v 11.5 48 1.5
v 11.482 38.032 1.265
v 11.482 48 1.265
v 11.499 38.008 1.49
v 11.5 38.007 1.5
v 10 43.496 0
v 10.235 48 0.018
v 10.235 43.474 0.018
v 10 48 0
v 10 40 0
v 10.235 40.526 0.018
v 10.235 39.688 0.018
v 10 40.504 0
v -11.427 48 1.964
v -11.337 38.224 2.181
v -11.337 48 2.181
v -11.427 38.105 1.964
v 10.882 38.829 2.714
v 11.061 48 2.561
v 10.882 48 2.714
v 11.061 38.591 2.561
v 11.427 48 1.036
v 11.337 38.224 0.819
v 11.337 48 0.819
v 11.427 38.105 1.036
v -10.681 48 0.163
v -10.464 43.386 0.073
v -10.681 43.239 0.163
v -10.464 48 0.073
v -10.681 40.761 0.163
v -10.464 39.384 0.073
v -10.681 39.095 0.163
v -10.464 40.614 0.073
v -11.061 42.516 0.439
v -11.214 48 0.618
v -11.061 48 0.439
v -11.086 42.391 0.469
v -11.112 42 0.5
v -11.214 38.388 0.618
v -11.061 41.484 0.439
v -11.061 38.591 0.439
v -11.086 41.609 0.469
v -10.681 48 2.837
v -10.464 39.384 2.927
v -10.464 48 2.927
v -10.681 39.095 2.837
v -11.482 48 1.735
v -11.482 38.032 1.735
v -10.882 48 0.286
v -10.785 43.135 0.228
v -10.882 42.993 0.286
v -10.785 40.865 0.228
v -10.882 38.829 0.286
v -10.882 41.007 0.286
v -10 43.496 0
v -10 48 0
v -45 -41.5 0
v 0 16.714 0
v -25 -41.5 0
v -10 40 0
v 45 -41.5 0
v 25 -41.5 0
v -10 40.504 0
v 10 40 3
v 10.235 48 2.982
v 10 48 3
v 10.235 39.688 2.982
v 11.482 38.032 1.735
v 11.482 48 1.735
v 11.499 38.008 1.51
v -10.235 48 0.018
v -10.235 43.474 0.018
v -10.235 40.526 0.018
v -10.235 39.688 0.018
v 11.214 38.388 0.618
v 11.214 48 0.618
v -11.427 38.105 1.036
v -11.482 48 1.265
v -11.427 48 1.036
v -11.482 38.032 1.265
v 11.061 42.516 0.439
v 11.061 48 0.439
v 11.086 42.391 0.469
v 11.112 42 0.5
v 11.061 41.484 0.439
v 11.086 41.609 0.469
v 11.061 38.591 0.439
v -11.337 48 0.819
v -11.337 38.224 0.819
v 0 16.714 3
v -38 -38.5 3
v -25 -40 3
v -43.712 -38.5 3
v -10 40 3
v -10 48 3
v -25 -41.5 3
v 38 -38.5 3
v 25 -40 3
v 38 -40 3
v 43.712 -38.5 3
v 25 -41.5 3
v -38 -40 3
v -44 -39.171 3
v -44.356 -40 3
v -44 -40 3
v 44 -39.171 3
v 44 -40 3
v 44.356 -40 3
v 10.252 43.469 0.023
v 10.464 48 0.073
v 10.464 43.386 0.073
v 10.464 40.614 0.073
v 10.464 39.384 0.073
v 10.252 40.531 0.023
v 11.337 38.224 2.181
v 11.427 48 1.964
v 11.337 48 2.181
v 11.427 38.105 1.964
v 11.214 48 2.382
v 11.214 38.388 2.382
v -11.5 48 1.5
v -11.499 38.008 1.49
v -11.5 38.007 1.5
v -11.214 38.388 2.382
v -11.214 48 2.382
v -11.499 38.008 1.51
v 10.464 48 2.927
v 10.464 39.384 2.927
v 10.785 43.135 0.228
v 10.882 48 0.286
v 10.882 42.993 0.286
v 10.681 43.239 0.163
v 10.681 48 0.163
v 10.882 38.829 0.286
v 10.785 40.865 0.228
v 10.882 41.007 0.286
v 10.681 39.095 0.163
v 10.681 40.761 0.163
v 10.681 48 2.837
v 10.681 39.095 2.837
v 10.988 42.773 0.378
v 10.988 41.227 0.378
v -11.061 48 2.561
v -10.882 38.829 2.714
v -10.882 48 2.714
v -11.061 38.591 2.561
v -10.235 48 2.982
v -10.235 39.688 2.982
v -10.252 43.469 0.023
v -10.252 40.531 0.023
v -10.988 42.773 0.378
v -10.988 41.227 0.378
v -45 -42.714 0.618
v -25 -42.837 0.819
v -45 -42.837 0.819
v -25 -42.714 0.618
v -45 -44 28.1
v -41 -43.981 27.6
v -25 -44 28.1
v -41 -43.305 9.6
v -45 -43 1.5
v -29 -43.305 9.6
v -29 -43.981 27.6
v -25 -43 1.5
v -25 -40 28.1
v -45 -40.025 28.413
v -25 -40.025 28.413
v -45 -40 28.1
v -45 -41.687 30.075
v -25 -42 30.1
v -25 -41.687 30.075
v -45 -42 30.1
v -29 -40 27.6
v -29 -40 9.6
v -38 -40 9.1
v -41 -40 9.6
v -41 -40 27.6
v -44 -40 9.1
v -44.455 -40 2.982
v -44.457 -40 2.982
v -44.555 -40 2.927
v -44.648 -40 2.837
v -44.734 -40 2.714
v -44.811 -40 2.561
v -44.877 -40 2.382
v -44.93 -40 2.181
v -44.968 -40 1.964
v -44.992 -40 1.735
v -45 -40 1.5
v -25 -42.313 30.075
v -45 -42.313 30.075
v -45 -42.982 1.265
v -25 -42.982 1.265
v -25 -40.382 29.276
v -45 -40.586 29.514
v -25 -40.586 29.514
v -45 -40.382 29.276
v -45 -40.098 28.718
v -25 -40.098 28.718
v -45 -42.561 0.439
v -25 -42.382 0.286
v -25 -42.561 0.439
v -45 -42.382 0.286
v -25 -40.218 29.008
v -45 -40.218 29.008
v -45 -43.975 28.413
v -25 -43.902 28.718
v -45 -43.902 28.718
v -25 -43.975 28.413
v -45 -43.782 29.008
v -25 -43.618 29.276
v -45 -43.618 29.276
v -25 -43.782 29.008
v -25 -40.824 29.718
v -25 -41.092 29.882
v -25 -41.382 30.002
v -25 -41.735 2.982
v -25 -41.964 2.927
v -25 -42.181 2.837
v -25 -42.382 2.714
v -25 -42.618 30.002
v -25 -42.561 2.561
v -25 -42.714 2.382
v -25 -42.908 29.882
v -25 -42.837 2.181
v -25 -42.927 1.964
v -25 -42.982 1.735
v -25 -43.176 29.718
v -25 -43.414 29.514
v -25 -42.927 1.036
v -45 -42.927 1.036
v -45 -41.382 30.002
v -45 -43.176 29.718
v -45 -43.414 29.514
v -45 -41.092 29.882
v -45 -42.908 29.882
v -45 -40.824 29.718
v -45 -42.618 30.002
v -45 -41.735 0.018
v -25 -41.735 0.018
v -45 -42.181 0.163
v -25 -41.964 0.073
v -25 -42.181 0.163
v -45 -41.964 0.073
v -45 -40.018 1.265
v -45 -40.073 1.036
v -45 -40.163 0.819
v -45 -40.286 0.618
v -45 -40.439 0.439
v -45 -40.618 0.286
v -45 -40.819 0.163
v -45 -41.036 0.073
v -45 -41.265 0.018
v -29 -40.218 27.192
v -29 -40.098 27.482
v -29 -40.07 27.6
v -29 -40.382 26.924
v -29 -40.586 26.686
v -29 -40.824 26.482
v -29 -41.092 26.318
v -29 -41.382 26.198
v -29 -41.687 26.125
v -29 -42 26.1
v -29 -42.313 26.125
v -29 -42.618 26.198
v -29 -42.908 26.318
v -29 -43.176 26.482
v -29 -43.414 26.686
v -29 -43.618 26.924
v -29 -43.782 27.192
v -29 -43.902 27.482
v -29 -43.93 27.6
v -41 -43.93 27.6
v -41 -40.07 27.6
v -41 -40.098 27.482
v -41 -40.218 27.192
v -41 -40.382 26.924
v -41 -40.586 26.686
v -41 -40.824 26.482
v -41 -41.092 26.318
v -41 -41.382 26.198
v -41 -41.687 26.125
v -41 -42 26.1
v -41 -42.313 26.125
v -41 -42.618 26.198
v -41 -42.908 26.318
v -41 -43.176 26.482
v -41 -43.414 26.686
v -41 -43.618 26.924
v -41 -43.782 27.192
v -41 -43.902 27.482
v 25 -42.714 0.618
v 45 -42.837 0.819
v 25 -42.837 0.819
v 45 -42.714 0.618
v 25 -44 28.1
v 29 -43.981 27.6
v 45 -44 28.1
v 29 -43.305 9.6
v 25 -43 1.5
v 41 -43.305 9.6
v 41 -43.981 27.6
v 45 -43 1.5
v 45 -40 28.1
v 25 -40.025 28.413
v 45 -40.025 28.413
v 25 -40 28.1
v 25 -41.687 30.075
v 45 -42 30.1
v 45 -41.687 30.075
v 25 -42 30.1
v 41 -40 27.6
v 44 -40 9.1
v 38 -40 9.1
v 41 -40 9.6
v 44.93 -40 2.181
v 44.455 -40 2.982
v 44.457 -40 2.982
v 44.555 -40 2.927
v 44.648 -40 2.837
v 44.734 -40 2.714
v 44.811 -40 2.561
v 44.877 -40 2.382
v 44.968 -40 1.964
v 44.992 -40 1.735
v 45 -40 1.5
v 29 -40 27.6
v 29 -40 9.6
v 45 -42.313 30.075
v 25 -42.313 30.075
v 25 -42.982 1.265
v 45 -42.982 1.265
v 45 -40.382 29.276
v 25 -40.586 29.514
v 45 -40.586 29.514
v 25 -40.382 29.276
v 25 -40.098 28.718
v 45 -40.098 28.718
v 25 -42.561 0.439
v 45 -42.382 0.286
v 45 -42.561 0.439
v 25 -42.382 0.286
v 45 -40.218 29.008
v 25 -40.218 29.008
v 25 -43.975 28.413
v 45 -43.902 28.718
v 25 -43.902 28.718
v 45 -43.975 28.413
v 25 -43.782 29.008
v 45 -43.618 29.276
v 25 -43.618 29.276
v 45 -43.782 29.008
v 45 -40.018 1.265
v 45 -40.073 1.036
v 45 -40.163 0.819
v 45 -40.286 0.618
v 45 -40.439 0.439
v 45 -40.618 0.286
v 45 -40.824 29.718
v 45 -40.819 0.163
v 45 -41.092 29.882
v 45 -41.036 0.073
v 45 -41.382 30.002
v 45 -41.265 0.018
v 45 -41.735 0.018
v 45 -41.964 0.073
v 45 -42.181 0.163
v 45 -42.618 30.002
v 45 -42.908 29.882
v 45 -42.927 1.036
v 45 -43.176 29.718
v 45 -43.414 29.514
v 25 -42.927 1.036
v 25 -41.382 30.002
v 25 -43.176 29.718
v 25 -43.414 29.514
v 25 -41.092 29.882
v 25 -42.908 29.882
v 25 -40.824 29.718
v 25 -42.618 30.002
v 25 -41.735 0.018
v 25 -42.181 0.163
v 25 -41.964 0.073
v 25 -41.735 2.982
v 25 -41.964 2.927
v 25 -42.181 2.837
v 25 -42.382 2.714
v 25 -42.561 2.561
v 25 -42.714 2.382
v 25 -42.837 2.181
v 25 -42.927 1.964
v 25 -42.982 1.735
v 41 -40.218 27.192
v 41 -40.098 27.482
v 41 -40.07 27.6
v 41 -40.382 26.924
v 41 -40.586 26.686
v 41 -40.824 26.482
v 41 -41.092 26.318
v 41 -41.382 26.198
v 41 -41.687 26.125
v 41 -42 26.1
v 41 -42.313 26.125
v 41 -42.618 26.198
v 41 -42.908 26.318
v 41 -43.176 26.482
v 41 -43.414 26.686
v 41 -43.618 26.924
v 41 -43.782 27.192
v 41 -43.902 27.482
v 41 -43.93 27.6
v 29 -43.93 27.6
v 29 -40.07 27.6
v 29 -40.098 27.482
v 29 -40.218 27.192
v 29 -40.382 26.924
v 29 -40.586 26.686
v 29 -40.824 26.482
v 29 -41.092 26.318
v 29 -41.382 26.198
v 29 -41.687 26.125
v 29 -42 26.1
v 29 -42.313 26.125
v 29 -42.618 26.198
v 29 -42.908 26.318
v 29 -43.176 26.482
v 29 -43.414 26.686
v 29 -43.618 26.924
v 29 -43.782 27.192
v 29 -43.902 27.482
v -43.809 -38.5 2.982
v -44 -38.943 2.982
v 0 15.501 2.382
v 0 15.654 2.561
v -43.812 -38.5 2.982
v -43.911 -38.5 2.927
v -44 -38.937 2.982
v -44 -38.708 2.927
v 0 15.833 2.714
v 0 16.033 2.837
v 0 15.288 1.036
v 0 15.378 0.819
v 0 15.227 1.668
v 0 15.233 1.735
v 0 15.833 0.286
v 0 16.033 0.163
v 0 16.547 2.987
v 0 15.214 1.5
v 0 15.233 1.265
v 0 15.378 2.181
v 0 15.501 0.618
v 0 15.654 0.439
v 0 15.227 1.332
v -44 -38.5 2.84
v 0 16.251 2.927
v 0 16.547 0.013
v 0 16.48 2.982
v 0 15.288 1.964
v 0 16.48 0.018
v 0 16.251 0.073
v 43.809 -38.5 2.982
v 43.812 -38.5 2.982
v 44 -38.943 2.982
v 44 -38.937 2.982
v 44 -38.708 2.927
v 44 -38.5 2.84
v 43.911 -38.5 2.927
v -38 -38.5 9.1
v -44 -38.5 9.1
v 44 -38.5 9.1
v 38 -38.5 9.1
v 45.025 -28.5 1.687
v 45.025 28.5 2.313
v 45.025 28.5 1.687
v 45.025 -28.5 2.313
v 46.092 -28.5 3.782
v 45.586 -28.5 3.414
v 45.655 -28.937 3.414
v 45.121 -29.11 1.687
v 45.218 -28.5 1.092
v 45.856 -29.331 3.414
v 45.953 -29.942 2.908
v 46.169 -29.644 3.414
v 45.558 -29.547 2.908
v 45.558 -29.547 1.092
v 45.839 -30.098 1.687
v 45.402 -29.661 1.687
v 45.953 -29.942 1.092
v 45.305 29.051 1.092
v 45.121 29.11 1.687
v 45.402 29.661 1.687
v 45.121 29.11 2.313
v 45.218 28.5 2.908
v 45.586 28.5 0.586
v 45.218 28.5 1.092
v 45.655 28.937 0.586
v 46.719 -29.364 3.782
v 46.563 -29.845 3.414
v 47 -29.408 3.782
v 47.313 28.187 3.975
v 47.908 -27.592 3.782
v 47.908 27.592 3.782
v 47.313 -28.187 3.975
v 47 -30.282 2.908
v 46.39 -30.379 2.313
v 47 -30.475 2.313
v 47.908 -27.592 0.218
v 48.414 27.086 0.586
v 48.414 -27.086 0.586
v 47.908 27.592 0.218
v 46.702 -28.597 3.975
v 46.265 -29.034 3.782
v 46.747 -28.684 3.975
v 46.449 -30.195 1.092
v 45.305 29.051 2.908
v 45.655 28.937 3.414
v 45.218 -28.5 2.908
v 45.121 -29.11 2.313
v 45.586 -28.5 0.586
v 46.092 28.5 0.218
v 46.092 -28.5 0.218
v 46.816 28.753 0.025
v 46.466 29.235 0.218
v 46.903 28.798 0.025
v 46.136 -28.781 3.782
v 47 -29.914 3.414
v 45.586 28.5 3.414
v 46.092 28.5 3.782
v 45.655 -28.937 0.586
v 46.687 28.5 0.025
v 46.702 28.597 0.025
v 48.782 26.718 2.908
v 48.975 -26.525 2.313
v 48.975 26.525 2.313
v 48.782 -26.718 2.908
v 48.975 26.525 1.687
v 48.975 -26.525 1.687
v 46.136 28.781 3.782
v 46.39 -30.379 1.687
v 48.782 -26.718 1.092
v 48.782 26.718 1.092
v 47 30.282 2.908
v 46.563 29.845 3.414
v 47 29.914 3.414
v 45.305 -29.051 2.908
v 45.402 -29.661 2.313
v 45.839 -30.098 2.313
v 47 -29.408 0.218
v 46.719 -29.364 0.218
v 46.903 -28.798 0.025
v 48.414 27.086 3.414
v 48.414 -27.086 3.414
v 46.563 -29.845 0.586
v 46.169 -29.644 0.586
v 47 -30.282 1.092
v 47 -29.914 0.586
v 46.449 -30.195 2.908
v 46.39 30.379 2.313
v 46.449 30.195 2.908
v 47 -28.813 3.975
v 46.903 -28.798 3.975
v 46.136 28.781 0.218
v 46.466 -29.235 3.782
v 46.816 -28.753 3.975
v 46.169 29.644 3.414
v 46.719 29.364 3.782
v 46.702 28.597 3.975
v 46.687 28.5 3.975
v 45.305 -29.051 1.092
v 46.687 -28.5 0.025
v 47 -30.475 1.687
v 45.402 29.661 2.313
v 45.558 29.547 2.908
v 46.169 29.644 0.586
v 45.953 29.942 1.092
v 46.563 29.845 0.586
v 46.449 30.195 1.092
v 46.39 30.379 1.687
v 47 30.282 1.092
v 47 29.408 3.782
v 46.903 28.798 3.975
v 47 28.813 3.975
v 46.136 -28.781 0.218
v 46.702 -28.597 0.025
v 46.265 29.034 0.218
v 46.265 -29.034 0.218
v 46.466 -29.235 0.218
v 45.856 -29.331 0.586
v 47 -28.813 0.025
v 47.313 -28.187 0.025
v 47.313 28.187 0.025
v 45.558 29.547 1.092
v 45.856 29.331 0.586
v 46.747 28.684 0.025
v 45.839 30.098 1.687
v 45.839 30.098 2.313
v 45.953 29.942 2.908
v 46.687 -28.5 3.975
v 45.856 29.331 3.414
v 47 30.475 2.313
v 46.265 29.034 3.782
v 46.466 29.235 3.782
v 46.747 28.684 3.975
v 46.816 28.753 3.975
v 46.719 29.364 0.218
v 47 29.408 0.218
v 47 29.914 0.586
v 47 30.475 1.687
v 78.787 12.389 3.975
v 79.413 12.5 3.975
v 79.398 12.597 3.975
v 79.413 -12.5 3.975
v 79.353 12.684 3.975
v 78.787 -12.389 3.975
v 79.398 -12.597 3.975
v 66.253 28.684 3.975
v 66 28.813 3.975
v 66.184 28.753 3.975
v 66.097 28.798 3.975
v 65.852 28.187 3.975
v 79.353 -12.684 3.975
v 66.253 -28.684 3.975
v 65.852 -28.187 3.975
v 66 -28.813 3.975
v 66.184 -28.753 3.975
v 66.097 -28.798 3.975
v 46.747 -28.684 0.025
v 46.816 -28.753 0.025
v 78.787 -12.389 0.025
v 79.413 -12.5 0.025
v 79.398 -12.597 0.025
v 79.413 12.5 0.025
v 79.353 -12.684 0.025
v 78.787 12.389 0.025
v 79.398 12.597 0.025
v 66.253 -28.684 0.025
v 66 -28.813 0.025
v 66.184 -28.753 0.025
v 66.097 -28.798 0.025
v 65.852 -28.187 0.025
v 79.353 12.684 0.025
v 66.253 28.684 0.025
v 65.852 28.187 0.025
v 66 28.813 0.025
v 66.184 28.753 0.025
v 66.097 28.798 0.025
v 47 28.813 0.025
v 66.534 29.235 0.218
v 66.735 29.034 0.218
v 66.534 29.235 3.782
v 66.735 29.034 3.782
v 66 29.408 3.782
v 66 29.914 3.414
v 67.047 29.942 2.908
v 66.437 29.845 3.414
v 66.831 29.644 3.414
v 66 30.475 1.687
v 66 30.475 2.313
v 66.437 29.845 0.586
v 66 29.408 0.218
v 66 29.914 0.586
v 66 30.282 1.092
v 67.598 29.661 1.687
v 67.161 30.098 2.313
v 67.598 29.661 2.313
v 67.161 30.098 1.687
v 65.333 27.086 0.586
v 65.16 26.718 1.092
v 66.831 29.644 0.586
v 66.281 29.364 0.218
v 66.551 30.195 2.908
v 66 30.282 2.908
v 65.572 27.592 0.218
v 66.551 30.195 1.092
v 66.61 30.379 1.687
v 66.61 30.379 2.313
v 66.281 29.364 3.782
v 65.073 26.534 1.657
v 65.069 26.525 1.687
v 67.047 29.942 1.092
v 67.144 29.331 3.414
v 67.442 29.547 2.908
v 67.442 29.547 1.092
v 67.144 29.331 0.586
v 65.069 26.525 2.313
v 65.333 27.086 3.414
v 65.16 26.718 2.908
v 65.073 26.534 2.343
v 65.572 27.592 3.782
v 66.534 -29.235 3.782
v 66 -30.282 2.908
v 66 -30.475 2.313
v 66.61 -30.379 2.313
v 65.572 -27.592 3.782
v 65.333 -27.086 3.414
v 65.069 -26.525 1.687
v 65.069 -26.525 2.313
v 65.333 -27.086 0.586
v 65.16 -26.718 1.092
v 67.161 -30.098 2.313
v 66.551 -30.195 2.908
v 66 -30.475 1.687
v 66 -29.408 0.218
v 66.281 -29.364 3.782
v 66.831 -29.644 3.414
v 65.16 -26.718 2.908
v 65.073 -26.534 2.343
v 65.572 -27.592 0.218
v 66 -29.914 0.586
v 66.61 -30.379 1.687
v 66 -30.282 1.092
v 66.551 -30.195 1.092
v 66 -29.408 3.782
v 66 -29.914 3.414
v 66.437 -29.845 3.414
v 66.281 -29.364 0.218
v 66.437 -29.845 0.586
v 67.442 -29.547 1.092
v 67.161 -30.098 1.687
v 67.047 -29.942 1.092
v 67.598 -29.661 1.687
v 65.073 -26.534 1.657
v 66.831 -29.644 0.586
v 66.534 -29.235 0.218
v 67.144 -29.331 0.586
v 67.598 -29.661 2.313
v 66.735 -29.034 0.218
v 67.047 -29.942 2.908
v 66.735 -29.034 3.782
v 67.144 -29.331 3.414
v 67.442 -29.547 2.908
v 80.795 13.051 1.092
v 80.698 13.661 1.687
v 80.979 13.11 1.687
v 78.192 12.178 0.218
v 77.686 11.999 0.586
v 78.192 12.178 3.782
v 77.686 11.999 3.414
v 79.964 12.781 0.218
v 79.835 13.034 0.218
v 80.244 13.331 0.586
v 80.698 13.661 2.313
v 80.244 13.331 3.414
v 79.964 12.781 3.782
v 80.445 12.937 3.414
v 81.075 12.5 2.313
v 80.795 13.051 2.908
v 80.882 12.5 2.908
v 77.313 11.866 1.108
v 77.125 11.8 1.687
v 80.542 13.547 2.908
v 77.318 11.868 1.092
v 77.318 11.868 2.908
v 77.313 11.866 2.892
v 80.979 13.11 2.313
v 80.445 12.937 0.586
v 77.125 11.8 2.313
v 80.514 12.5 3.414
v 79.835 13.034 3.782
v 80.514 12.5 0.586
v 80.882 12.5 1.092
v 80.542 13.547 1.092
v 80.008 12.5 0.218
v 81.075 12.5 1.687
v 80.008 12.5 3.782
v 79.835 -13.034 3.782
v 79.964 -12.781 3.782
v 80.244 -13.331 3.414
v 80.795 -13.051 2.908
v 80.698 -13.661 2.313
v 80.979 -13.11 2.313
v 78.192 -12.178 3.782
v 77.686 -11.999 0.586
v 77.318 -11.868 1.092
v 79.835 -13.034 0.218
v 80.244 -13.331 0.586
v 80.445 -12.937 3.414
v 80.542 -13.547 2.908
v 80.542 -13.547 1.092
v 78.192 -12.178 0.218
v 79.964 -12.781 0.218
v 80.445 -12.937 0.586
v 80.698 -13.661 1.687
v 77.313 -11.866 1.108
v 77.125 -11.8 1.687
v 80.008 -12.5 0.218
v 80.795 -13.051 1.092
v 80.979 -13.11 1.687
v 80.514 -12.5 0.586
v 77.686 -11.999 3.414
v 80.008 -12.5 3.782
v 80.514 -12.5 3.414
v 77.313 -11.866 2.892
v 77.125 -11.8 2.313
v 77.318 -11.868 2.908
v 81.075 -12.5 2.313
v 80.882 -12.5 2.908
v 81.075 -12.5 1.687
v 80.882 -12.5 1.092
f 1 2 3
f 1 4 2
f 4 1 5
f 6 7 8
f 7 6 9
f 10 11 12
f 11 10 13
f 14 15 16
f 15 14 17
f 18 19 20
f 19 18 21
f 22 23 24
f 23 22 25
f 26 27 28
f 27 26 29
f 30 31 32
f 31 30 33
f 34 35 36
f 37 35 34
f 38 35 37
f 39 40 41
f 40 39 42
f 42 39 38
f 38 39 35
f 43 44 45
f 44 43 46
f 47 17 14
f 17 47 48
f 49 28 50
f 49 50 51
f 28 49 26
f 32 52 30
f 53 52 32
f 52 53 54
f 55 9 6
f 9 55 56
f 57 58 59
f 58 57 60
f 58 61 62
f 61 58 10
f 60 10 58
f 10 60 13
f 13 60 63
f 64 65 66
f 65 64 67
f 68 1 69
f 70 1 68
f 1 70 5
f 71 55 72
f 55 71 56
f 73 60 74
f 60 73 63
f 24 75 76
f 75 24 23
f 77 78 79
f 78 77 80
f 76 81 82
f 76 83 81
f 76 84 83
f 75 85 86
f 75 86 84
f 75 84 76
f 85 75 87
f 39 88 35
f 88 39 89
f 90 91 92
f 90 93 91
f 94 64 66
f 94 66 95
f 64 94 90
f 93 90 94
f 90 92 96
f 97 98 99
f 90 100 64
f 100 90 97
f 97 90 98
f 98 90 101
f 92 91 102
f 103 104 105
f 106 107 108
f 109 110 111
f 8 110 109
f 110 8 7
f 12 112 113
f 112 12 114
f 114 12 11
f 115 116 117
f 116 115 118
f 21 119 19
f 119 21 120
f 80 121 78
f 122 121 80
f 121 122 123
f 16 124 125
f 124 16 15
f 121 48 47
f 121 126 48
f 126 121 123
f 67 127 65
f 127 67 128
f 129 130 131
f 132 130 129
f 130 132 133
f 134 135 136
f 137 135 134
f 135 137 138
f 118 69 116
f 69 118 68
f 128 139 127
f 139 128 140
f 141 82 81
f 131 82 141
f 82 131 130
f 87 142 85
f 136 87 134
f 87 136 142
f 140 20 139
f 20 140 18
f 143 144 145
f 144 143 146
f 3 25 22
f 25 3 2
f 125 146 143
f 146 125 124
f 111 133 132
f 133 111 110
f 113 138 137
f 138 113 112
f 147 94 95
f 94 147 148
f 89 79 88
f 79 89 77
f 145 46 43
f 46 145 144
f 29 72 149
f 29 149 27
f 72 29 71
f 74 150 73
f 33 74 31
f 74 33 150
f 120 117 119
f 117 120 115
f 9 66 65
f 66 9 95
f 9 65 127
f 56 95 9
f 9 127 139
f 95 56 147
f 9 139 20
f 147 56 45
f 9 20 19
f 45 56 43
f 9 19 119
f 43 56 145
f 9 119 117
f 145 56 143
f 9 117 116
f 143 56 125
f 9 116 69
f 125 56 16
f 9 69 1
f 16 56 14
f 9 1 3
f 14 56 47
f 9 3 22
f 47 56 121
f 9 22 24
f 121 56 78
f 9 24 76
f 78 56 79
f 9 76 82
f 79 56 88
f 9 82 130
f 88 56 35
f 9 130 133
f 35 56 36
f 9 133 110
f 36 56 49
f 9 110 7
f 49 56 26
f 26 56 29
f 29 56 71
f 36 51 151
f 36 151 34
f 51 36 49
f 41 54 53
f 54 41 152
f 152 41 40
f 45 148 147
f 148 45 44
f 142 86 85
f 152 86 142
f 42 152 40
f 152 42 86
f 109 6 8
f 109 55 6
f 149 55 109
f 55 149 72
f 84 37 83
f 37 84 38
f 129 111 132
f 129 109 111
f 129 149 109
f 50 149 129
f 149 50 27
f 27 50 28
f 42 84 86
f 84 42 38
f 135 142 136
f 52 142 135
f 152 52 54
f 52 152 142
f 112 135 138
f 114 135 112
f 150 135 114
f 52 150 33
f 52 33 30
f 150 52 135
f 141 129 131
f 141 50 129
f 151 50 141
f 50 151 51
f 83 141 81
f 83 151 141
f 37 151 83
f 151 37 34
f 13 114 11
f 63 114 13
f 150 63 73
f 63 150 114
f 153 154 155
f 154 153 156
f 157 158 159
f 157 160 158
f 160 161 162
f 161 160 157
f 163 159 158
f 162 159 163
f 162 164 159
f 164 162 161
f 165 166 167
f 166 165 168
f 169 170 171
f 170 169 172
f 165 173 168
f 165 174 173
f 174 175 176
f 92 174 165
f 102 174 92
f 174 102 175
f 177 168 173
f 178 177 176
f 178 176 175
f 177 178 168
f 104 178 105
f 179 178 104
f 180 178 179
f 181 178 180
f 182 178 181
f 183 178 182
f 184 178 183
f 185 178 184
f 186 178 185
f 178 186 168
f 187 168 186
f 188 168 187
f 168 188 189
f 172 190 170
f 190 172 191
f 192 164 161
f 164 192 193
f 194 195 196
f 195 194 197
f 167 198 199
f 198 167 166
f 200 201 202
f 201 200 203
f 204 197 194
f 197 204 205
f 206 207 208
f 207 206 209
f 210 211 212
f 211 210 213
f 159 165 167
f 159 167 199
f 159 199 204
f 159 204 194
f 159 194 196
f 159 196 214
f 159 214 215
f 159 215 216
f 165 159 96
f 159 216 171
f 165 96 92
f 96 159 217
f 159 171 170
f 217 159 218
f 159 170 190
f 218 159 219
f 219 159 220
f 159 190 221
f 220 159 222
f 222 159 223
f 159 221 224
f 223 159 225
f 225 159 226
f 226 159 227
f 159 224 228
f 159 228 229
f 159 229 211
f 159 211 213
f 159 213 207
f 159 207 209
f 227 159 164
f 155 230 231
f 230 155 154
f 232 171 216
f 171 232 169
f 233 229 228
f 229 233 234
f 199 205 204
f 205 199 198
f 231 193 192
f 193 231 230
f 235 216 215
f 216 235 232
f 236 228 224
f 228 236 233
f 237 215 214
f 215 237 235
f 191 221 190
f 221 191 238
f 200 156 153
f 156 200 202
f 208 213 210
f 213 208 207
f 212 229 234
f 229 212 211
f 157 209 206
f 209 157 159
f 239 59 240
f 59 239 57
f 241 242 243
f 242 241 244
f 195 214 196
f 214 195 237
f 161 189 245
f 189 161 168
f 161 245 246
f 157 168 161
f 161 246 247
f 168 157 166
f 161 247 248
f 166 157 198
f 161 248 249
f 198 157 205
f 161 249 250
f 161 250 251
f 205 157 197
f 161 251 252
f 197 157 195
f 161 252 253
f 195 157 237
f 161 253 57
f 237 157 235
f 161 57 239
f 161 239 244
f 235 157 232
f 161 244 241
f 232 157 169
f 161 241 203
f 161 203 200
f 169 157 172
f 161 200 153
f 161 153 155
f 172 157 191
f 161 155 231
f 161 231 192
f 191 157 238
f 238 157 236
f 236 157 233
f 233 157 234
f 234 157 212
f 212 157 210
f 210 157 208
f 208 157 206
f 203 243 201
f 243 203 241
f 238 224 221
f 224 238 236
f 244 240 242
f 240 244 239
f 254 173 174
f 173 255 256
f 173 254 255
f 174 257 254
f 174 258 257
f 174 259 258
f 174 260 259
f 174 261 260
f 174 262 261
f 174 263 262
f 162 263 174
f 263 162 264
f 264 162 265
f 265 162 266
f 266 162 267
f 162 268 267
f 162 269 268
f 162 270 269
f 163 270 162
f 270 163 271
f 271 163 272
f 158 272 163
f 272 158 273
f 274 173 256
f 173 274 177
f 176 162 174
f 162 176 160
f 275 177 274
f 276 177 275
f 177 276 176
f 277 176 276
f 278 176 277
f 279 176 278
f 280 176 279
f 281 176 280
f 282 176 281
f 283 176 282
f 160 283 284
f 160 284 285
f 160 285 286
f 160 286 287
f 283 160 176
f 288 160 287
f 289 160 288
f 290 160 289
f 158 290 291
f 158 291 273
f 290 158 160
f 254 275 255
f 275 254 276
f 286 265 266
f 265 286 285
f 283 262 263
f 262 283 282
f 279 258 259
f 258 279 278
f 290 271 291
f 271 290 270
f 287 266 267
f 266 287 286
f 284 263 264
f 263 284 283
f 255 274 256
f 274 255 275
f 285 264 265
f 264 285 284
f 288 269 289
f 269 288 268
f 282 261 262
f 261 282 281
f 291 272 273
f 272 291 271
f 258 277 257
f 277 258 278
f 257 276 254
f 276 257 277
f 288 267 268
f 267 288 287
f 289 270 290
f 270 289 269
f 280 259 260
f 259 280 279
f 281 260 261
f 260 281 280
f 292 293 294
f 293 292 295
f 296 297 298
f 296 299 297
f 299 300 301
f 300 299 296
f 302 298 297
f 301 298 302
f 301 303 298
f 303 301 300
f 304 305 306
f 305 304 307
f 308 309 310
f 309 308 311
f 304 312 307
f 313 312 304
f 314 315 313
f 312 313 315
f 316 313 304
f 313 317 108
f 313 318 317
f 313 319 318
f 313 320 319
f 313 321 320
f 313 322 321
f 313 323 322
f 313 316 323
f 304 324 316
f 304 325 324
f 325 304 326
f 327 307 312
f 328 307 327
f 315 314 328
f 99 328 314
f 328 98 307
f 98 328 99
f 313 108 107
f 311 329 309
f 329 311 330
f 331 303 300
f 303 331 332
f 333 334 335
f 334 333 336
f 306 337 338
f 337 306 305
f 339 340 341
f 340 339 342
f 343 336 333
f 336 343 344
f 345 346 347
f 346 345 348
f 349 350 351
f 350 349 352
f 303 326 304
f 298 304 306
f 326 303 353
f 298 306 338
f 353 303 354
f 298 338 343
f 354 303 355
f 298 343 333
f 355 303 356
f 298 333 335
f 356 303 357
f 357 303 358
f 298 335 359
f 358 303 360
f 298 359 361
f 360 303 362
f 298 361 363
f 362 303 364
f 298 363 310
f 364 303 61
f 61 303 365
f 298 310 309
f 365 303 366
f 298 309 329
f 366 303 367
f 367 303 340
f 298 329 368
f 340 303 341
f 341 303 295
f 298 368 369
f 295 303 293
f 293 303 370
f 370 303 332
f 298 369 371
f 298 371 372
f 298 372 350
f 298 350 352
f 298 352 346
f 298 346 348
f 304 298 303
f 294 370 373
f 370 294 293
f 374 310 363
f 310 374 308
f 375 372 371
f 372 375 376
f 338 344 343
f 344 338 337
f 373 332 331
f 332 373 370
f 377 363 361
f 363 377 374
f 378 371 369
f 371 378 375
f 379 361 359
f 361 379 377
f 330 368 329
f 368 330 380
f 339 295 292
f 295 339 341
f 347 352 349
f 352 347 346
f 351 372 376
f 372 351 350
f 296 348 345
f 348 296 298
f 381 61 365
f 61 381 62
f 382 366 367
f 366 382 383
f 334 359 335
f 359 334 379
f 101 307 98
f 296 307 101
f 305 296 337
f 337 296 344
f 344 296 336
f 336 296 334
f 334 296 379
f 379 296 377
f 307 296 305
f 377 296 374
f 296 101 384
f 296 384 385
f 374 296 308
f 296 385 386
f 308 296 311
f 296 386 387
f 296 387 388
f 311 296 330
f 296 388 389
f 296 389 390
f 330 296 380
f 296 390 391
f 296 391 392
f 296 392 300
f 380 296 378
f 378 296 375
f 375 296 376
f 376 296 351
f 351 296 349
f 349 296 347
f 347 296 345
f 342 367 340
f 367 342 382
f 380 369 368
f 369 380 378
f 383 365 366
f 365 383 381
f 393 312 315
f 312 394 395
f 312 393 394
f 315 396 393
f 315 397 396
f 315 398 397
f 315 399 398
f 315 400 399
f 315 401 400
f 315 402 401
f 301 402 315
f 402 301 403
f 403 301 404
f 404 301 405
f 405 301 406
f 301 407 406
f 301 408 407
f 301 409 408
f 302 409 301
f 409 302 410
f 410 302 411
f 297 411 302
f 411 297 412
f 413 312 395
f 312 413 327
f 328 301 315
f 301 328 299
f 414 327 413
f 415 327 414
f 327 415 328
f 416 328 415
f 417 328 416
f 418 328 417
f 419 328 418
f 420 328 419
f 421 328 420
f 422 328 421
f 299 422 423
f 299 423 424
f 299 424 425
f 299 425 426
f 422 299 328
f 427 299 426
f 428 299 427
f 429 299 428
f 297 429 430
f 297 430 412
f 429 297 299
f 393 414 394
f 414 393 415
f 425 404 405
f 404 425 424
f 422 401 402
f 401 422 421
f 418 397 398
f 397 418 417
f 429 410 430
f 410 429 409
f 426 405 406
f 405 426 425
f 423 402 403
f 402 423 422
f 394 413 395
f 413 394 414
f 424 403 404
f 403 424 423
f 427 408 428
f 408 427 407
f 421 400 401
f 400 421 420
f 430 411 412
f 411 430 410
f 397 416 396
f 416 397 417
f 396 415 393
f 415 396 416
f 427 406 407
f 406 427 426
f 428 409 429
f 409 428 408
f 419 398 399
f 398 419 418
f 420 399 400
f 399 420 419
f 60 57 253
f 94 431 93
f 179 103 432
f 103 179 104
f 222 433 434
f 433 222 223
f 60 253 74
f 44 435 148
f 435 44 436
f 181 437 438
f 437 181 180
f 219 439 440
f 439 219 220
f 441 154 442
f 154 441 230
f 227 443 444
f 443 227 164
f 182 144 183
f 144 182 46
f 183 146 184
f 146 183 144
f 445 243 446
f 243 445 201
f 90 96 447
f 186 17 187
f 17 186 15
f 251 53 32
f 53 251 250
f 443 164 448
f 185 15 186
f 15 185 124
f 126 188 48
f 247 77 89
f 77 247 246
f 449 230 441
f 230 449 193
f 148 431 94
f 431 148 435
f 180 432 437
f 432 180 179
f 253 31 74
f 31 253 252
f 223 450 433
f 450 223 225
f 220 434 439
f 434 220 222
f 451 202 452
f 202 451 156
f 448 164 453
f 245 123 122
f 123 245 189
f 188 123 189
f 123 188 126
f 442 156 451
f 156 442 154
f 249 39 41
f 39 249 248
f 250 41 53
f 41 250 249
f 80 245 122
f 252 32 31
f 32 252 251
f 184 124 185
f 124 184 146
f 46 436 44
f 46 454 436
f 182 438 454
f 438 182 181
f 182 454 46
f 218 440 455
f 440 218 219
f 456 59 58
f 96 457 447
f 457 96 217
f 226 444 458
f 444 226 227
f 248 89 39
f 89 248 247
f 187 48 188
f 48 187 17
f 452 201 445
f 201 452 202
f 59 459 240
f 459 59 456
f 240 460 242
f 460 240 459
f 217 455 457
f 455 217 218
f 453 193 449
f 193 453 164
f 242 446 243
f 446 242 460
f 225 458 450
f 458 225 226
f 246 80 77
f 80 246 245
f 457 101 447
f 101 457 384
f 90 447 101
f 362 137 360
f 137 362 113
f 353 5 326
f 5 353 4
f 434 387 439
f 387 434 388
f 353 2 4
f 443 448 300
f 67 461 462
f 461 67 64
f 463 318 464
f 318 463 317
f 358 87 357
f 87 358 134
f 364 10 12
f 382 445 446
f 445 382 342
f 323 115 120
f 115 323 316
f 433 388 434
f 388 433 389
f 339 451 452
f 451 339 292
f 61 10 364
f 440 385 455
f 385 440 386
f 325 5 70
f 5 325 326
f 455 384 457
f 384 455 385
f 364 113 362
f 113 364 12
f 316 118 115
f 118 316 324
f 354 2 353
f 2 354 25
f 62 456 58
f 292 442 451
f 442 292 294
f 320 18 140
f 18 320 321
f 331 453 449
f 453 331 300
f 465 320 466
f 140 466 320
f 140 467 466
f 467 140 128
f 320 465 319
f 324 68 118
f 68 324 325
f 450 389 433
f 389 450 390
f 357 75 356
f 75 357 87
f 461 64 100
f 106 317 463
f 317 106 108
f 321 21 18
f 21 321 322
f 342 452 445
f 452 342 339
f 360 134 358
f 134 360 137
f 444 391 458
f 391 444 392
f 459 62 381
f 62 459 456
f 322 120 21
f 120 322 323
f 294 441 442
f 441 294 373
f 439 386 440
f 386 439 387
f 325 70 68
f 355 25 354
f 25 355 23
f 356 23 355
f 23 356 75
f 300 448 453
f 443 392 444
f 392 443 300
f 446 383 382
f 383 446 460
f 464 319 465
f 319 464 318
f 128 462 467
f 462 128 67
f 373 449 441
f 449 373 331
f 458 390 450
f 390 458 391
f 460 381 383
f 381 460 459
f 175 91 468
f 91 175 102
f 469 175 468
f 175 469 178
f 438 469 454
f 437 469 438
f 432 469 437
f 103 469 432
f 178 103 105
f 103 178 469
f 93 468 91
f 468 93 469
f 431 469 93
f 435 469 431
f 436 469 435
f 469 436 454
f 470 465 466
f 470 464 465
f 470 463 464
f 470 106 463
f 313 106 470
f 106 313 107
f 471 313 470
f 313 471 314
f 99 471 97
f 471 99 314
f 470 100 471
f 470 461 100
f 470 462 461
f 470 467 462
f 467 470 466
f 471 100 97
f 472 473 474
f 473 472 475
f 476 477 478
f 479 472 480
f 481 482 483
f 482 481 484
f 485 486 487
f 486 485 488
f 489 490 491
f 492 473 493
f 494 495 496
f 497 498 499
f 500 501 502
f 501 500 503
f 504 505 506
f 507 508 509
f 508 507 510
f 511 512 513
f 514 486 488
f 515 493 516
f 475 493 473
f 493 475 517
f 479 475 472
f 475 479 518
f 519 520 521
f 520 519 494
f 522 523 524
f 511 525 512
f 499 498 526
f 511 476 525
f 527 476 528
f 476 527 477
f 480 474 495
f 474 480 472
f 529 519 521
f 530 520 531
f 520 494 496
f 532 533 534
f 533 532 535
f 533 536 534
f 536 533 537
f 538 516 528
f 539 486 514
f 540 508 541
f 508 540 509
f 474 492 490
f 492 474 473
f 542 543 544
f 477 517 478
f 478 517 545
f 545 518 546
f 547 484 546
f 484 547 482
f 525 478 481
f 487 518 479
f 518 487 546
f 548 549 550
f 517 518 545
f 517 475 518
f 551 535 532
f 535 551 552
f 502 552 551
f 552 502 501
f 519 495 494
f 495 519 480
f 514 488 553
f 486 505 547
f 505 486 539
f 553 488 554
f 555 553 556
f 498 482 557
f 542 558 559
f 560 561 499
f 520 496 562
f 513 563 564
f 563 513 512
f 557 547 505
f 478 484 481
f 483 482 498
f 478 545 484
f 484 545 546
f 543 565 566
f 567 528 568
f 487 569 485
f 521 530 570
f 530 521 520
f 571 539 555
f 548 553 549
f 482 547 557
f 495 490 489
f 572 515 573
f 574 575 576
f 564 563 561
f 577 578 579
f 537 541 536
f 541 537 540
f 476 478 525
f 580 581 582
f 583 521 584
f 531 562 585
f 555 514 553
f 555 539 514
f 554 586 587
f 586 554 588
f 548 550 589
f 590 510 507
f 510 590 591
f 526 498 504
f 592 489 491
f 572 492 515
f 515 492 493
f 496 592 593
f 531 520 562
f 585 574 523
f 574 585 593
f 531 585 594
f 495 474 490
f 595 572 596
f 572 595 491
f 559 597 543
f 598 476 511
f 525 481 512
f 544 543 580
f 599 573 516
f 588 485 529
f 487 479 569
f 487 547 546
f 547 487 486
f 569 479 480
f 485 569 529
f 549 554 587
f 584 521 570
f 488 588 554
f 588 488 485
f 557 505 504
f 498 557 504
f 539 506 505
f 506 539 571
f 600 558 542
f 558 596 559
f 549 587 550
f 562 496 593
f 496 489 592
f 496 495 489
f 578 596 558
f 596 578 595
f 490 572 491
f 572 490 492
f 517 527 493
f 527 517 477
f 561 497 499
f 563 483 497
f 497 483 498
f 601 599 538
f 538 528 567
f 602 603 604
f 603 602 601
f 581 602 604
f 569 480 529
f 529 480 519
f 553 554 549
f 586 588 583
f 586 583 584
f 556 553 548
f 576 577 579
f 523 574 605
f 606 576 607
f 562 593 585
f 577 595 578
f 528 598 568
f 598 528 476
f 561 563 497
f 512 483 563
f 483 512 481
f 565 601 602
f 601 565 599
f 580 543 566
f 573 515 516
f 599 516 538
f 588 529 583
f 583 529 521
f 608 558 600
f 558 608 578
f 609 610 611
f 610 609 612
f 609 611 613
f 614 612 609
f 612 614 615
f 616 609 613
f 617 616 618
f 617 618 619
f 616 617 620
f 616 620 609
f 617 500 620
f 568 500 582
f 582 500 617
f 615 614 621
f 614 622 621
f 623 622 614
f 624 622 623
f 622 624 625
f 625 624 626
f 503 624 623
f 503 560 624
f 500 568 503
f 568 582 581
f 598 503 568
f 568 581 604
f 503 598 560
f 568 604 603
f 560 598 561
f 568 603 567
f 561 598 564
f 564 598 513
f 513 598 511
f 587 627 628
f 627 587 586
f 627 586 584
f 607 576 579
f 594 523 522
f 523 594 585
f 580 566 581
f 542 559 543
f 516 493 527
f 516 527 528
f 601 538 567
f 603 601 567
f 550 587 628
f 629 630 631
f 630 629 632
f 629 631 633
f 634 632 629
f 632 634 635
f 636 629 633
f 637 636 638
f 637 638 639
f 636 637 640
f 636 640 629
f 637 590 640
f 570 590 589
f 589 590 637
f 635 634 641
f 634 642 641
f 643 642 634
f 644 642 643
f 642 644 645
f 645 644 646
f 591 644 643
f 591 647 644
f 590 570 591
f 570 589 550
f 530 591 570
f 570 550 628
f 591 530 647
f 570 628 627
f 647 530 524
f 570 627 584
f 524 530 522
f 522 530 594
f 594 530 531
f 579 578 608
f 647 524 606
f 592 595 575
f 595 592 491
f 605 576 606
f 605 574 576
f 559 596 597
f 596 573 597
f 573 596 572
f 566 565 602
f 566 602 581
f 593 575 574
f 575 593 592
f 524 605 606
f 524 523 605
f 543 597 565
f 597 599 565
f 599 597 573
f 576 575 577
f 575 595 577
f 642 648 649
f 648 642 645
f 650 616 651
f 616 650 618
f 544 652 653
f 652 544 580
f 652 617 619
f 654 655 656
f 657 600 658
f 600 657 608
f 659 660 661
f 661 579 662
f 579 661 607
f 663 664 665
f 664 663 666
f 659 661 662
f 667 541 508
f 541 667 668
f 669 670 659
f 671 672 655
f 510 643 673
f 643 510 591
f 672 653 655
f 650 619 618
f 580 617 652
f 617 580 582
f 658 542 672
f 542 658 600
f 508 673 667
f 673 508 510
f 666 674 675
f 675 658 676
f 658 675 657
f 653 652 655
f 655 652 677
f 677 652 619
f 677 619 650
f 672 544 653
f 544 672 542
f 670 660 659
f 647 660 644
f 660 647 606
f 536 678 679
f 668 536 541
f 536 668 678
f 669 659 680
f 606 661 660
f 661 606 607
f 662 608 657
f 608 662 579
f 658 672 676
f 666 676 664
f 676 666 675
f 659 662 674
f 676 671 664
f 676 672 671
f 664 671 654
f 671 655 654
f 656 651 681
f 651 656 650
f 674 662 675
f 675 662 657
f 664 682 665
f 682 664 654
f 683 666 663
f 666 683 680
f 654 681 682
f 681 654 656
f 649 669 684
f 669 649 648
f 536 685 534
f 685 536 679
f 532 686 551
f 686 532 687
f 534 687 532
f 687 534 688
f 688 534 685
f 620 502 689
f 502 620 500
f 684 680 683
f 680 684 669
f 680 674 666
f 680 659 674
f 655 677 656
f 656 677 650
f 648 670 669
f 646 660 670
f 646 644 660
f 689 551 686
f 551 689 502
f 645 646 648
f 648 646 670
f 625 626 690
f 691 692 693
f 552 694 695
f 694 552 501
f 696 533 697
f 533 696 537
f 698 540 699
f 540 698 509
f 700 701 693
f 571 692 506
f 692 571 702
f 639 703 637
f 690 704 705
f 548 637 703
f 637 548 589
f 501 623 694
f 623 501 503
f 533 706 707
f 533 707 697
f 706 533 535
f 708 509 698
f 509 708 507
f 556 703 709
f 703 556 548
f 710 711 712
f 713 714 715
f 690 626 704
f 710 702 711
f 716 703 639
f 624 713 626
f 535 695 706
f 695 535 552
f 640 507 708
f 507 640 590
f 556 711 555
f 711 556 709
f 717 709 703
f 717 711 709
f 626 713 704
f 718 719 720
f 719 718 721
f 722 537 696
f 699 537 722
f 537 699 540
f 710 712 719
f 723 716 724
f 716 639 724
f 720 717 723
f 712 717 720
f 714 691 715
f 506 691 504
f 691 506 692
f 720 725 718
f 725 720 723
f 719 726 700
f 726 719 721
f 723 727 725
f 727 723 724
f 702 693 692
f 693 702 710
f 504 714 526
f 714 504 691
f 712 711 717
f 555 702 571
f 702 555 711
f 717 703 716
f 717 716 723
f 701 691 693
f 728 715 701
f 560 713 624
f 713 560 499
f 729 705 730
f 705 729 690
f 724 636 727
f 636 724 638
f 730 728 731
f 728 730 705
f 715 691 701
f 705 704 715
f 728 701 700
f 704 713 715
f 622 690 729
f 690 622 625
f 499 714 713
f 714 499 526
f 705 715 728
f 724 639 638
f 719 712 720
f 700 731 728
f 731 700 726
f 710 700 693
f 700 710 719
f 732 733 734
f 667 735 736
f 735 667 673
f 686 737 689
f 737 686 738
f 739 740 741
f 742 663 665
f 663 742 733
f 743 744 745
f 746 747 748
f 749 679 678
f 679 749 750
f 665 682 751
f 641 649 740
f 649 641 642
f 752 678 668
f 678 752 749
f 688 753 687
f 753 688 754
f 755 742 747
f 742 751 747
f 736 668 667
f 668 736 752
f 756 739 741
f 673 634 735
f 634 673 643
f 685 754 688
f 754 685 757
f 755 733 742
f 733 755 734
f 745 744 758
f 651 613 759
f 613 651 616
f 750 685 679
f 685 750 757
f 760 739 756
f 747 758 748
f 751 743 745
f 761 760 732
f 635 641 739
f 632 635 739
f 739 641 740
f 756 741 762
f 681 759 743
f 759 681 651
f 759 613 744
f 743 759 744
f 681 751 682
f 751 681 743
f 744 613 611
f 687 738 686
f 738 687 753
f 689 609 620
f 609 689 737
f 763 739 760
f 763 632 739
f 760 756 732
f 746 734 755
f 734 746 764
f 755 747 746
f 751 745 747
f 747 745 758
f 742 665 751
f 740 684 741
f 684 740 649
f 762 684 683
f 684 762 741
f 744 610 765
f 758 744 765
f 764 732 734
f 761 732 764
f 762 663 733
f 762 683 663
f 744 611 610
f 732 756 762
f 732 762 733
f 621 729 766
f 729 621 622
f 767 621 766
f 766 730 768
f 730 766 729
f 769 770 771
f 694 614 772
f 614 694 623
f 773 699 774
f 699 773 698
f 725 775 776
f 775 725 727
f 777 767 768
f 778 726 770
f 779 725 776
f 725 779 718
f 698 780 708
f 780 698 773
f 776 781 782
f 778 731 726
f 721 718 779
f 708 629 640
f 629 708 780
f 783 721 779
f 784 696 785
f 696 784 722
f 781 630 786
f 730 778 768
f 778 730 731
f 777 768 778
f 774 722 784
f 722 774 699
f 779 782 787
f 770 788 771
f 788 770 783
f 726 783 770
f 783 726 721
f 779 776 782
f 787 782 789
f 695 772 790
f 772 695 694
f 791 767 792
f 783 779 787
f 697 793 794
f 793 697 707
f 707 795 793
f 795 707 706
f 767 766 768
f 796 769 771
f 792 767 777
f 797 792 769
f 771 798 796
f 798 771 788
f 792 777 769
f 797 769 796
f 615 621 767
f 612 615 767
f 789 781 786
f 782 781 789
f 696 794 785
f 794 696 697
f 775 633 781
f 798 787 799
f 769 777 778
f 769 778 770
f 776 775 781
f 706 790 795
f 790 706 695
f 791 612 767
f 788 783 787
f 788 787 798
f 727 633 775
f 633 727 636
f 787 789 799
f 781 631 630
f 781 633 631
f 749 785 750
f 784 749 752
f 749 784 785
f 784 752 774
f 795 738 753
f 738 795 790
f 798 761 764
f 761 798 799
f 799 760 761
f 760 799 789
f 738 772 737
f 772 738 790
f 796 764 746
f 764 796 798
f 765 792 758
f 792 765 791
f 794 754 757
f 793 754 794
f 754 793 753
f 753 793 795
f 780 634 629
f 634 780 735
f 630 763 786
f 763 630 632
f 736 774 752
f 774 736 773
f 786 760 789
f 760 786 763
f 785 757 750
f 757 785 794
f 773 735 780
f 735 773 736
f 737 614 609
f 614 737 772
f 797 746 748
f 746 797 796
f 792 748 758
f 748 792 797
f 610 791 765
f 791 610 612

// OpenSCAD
// A front panel to hinge and mount a OnePlus One phone into the Note4 VR Headset

// Which part to make?
part = "both"; // [first:Panel Only,second:Clip Only,both:Panel and Clip]

// Measured Width of Phone
phoneHeight = 77; // measured width of OnePlus One (sideways)

// Measured Depth of Phone (7.1 for iPhone6+, 9.1 for Oneplus One)
phoneDepth = 7.1; // measured depth of phone

/* [Hidden] */
$fn=40;
panelHeight = 80; // really measured it as 79
panelThickness = 3; // thickness of plastic for the panel
hingeThickness = 4; // thickness of lower hooks
hookSeparation = 70; // distance between the two lower hooks
hookWidth = 12; // width of the bottom hooks. Measured as 10.
hookDepth = 18; // distance from flat face to inner hook
foamFudge = 1; // fudge factor due to adding foam, clip radius being oversized, etc
tabWidth = 20; // width of upper tab
tabHeight = 8; // height to make the upper tab
clipThickness = 4; // how thick to make the clip
clipRadius = clipThickness * .5; // Same as clipThickness to make it round  clipThickness * .6; // radius for clips. They'll be slightly bigger than clipThickness
clipClearance = 55; // inner width for upper clip
clipDepthClearance = 17; // inner depth for upper clip
clipWidth = clipClearance + clipRadius; // adjusted for dimensioning
clipDepth = clipDepthClearance + clipRadius; // inner depth before taper for upper clip



if (part== "first") panel();
else if (part == "second") clip();
else if (part == "both") makeBoth();
else makeBoth();


module makeBoth()
{
	panel();
	
	translate ([(hookSeparation + hookWidth)/2 + hingeThickness + clipRadius, 0, 0]) 
	rotate([0,0,270])
	clip();
}

module panel()
{
	// create the panel itself
	union()
	{
		// first leg
		hull()
		{
			translate ([0,(panelHeight/2), panelThickness/2])
			rotate([0,90,0])
			cylinder(r=panelThickness/2, h=tabWidth, center=true);
			
			translate ([-hookSeparation/2, -(panelHeight/2 + panelThickness/2), panelThickness/2])
			rotate([0,90,0])
			cylinder(r=panelThickness/2, h=hookWidth + 2*hingeThickness, center=true);
		}
		
		// second leg
		hull()
		{
			translate ([0,(panelHeight/2), panelThickness/2])
			rotate([0,90,0])
			cylinder(r=panelThickness/2, h=tabWidth, center=true);
				
			translate ([hookSeparation/2, -(panelHeight/2 + panelThickness/2), panelThickness/2])
			rotate([0,90,0])
			cylinder(r=panelThickness/2, h=hookWidth + 2*hingeThickness, center=true);
		}
			
		// add tab
		difference()
		{
			hull()
			{
				translate ([-tabWidth/2, panelHeight/2 + tabHeight/2 - 1, panelThickness/2])
				rotate ([90,0,0])
				cylinder (r=panelThickness/2, h=tabHeight + 2, center=true);
		
				translate ([tabWidth/2, panelHeight/2 + tabHeight/2 - 1, panelThickness/2])
				rotate ([90,0,0])
				cylinder (r=panelThickness/2, h=tabHeight + 2, center=true);
			}
				
			// remove a notch for better clip grip
			translate ([0,(panelHeight + hingeThickness)/2, -clipRadius])
			rotate ([0,90,0])
			cylinder (r=clipRadius+.5,h=tabWidth * 2,center=true);
		}
			
		// add hooks
		translate ([-hookSeparation/2, -panelHeight/2, 0])
		hook();
		
		translate ([hookSeparation/2, -panelHeight/2, 0])
		hook();
			
		// add nubbins for onePlus self alignment (uncomment and adjust "phoneHeight" to make a mini platform to auto-align your phone)
		translate ([-(hookSeparation/2+hookWidth/2), -(panelHeight - (panelHeight - phoneHeight)/2) / 2, (panelThickness + phoneDepth + foamFudge) / 2])
		cube ([hookWidth/2, (panelHeight - phoneHeight)/2, phoneDepth], center=true);
		
		translate ([hookSeparation/2+hookWidth/2, -(panelHeight - (panelHeight - phoneHeight)/2) / 2, (panelThickness + phoneDepth + foamFudge) / 2])
		cube ([hookWidth/2, (panelHeight - phoneHeight)/2, phoneDepth], center=true);
		

	}
}	

module hook()
{
	// create the hooks
	difference()
	{
		hull()
		{
			translate ([0, -panelThickness/2, panelThickness/2])
			rotate([0,90,0])
			cylinder(r=panelThickness/2, h=hookWidth + 2*hingeThickness, center=true);
			
			translate([0, -hingeThickness/2, hingeThickness/2 + hookDepth + phoneDepth + foamFudge])
			rotate([0,90,0])
			cylinder(r=hingeThickness/2, h=hookWidth + 2*hingeThickness, center=true);

		}
		
		translate ([0, -hingeThickness/2, panelThickness/2 + hookDepth/2 + phoneDepth + foamFudge])
		cube ([hookWidth, 100, hookDepth], center=true);
	}
	
	// draw the cylinder back in
	translate([0, -hingeThickness/2, hingeThickness/2 + hookDepth + phoneDepth + foamFudge])
	rotate([0,90,0])
	cylinder(r=hingeThickness/2, h=hookWidth * 1.5, center=true);		

}

module clip()
{
	translate ([0,0,clipThickness/2])
	intersection()
	{
		union()
		{
			hull()
			{
				corner1();
				corner2();
			}
			hull()
			{
				corner1();
				corner3();
			}
			hull()
			{
				corner2();
				corner4();
			}
			hull()
			{
				corner3();
				corner5();
			}
			hull()
			{
				corner4();
				corner6();
			}
			hull()
			{
				corner5();
				corner6();
			}
		}

		cube([1000,1000,clipThickness],center=true); // narrowing the clip to create flats.
	}
}

module corner1() translate([-clipWidth/2,0,0]) sphere(r=clipRadius, $fn=20);
module corner2() translate([clipWidth/2,0,0]) sphere(r=clipRadius, $fn=20);
module corner3() translate([-clipWidth/2,clipDepth,0]) sphere(r=clipRadius, $fn=20);
module corner4() translate([clipWidth/2,clipDepth,0]) sphere(r=clipRadius, $fn=20);
module corner5() translate([-(tabWidth + clipThickness + 1)/2,clipDepth + phoneDepth + foamFudge + clipRadius + panelThickness,0]) sphere(r=clipRadius, $fn=20);
module corner6() translate([(tabWidth + clipThickness + 1)/2,clipDepth + phoneDepth + foamFudge + clipRadius + panelThickness,0]) sphere(r=clipRadius, $fn=20);
